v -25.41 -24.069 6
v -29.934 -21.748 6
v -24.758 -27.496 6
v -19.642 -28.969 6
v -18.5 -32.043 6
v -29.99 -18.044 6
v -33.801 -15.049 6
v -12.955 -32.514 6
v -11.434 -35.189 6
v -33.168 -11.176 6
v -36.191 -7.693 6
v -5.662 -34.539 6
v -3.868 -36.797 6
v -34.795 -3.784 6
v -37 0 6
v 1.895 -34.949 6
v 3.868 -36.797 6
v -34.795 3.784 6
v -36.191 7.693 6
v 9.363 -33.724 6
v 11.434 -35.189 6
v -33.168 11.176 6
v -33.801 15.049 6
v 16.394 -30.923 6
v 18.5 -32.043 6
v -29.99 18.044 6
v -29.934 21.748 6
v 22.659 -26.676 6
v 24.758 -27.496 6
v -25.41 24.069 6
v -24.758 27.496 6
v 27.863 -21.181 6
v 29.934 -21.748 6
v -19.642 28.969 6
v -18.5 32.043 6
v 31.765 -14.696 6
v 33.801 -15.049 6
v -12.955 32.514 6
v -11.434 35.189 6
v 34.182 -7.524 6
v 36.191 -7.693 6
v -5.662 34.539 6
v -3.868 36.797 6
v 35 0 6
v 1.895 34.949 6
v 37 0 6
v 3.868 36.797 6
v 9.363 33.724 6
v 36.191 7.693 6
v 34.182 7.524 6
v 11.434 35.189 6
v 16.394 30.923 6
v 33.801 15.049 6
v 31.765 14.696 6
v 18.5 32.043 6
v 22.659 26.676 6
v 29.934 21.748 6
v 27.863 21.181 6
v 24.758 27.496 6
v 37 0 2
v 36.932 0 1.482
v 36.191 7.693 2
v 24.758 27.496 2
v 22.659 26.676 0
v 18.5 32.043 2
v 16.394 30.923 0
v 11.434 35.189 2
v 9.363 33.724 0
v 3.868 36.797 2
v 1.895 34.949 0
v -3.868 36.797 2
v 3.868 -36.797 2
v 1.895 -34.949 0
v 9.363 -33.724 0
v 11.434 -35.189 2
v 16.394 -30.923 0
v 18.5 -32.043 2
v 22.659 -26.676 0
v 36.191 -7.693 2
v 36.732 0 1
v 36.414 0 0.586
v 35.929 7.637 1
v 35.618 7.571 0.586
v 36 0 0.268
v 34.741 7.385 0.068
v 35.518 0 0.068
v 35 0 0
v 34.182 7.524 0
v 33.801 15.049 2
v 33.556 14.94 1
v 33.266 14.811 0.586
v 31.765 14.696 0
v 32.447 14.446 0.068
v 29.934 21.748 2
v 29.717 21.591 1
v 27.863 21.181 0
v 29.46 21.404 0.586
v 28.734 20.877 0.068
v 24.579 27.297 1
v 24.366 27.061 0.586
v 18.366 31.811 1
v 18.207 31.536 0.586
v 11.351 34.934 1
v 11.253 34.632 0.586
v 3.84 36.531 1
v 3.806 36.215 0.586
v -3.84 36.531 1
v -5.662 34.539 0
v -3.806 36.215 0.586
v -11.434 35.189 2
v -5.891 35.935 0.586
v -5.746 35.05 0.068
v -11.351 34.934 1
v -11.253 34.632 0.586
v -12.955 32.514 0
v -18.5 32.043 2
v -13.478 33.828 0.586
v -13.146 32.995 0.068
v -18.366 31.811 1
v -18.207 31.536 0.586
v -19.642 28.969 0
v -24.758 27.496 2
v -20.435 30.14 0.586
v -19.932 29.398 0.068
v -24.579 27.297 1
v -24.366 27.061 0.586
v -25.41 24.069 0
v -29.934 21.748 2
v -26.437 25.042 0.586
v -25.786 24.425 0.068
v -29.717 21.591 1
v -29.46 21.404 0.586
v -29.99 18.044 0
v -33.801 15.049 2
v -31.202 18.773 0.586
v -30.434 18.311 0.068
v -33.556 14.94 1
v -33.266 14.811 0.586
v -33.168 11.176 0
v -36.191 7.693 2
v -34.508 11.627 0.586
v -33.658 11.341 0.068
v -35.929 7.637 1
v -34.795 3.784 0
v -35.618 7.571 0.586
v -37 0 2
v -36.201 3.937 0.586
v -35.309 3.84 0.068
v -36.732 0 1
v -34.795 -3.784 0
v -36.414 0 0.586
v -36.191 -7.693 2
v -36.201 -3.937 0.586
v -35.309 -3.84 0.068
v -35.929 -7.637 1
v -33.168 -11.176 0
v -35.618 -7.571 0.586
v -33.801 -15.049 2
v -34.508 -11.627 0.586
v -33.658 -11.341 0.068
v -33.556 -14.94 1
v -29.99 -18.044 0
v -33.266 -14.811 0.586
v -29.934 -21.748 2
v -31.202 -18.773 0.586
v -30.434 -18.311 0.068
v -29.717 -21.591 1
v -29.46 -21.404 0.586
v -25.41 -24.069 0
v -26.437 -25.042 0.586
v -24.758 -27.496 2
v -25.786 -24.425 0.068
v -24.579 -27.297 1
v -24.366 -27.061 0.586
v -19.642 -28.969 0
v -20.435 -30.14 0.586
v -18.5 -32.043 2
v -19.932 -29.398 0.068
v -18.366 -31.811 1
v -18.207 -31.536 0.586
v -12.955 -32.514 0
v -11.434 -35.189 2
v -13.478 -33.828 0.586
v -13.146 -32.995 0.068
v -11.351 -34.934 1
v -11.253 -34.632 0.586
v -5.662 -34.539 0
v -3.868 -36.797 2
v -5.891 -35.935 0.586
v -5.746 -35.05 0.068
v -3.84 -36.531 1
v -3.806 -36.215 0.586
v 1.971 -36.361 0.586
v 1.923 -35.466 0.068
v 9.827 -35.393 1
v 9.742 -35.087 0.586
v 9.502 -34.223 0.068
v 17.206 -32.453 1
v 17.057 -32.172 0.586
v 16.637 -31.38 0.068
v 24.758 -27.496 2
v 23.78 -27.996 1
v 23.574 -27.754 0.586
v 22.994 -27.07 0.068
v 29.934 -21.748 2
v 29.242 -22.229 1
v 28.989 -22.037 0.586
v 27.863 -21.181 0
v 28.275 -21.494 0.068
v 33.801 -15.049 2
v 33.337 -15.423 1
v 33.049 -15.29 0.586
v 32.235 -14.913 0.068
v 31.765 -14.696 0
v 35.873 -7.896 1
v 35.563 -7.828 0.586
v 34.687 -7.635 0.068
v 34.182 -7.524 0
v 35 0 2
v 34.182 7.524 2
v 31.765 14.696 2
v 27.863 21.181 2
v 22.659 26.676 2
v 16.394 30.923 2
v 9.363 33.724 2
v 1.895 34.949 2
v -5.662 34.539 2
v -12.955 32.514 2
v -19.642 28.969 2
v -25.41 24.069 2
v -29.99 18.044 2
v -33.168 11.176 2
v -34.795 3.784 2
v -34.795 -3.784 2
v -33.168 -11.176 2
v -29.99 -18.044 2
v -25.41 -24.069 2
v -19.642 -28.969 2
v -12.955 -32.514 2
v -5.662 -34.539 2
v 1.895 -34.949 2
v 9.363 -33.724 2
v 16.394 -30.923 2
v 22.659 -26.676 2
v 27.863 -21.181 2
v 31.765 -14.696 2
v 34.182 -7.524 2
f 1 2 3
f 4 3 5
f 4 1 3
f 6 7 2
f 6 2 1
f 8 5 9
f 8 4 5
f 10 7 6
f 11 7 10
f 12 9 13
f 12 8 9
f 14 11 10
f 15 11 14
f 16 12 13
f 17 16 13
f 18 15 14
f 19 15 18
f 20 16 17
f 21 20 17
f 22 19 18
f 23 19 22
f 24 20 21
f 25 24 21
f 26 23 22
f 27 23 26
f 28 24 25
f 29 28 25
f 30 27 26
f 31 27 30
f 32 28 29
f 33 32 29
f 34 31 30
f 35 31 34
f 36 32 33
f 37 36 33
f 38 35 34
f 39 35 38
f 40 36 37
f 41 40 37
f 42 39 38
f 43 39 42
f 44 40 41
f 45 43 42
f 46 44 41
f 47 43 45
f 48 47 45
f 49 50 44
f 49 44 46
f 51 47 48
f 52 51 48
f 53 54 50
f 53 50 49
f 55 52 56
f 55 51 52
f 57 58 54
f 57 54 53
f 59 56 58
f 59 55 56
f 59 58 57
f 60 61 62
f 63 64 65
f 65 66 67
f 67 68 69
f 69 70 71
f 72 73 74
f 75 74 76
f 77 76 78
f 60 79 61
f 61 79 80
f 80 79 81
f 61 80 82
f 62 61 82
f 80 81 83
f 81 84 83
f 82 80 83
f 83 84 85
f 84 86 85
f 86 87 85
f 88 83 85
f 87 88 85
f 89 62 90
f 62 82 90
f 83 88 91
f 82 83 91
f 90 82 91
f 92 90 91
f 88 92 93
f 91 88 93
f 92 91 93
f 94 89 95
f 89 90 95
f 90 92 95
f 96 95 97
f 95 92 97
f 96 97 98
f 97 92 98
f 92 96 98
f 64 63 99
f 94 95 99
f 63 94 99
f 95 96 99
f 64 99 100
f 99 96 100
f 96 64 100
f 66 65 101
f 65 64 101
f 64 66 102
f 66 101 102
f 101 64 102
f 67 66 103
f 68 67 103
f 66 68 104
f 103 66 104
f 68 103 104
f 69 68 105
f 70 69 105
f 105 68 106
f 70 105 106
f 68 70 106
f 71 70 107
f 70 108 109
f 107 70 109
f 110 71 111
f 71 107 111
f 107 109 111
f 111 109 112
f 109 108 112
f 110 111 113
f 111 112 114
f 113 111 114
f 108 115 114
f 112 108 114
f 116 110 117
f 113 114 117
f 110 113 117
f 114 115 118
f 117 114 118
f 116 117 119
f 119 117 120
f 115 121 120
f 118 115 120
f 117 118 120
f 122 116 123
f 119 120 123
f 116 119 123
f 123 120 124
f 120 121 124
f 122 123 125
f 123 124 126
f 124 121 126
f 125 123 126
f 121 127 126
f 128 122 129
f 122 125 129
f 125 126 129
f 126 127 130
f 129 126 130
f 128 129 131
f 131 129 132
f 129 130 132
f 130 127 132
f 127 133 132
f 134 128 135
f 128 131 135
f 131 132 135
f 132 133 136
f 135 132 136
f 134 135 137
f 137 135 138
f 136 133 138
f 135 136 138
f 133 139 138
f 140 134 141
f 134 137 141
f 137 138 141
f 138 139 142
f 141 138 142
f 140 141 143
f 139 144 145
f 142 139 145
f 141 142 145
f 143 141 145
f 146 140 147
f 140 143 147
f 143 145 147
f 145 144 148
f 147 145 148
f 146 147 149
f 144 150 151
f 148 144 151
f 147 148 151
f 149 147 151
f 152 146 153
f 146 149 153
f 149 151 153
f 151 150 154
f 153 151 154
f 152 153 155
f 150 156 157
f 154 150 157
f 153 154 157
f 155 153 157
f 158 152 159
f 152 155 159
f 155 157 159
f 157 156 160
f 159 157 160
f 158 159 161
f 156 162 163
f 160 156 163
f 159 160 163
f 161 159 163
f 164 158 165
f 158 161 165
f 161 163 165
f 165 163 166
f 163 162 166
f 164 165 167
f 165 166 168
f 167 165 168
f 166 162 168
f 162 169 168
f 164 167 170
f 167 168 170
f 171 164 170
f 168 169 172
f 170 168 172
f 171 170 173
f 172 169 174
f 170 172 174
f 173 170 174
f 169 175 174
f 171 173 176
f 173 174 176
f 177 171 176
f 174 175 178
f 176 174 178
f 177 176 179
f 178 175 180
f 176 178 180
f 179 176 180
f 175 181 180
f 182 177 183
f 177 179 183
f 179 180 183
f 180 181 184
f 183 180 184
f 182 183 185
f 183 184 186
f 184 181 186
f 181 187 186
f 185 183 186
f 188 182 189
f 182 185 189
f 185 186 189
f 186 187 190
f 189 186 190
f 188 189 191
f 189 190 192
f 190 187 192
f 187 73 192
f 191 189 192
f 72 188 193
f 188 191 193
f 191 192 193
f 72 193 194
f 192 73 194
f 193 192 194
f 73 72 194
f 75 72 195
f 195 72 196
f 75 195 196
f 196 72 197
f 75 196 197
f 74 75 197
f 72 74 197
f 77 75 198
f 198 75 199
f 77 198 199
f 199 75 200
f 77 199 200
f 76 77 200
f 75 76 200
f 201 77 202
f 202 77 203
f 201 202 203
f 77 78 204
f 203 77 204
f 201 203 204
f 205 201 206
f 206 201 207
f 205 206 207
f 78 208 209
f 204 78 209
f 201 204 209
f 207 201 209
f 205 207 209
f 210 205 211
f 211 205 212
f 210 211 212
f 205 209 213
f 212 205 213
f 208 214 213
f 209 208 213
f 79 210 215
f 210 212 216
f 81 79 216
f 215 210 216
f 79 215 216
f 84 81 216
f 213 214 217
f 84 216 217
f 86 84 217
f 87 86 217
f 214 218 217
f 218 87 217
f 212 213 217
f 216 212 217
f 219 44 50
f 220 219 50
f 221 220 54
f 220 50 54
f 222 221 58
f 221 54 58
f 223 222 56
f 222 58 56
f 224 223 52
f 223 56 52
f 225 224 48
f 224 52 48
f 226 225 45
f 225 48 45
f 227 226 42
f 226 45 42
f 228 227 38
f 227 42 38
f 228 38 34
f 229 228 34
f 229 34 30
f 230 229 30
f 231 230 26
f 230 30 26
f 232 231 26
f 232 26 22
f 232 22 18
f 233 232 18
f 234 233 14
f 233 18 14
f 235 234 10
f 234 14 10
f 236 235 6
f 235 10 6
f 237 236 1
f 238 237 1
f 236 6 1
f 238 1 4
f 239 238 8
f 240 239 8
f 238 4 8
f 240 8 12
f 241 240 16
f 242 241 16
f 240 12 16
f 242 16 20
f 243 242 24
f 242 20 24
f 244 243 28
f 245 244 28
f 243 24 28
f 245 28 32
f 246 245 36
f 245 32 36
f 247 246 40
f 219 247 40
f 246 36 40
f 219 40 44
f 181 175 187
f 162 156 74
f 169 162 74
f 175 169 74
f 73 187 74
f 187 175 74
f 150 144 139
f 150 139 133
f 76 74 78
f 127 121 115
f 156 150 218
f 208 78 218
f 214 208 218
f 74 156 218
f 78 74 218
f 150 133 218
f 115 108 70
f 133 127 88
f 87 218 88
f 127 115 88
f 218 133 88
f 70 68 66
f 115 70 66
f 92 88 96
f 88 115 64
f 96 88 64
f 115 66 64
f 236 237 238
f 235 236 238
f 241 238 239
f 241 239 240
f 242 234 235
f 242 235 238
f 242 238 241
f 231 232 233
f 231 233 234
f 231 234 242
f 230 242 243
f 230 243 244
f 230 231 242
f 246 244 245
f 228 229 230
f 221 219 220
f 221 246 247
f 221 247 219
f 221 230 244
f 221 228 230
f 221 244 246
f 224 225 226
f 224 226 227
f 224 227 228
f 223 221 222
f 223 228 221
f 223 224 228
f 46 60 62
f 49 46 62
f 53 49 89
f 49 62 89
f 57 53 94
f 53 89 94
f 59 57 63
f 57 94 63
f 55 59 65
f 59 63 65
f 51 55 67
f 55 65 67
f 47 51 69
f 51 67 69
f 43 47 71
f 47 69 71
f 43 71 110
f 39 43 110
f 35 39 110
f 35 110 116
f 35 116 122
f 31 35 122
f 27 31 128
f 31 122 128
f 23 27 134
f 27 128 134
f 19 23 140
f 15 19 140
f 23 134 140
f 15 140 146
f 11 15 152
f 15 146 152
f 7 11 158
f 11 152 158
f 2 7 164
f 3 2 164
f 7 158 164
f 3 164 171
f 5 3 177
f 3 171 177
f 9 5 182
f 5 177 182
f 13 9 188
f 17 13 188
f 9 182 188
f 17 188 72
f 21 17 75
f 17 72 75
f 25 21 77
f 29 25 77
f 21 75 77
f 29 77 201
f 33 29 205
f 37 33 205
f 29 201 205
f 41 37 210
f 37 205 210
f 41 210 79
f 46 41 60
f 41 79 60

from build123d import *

# Parameters (mm, degrees)
ESQUISSE1_R             = 37
BOSS_EXTRU_1_DEPTH      = 6
ESQUISSE2_R             = 35
ENL_V_MAT_EXTRU_1_DEPTH = 4
CONG_1_R                = 2


with BuildPart() as part:
    # Esquisse1 → Boss.-Extru.1 (new body)
    with BuildSketch(Plane.XY):
        Circle(ESQUISSE1_R)
    extrude(amount=BOSS_EXTRU_1_DEPTH)

    # Esquisse2 → Enlèv. mat.-Extru.1 (cut)
    with BuildSketch(Plane.XY.offset(6)):
        Circle(ESQUISSE2_R)
    extrude(amount=-ENL_V_MAT_EXTRU_1_DEPTH, mode=Mode.SUBTRACT)

    # Congé1
    cong_1_edges = [part.edges().sort_by_distance(p)[0] for p in [
        (-37, 0, 0),
    ]]
    fillet(cong_1_edges, radius=CONG_1_R)


solid = part.part
